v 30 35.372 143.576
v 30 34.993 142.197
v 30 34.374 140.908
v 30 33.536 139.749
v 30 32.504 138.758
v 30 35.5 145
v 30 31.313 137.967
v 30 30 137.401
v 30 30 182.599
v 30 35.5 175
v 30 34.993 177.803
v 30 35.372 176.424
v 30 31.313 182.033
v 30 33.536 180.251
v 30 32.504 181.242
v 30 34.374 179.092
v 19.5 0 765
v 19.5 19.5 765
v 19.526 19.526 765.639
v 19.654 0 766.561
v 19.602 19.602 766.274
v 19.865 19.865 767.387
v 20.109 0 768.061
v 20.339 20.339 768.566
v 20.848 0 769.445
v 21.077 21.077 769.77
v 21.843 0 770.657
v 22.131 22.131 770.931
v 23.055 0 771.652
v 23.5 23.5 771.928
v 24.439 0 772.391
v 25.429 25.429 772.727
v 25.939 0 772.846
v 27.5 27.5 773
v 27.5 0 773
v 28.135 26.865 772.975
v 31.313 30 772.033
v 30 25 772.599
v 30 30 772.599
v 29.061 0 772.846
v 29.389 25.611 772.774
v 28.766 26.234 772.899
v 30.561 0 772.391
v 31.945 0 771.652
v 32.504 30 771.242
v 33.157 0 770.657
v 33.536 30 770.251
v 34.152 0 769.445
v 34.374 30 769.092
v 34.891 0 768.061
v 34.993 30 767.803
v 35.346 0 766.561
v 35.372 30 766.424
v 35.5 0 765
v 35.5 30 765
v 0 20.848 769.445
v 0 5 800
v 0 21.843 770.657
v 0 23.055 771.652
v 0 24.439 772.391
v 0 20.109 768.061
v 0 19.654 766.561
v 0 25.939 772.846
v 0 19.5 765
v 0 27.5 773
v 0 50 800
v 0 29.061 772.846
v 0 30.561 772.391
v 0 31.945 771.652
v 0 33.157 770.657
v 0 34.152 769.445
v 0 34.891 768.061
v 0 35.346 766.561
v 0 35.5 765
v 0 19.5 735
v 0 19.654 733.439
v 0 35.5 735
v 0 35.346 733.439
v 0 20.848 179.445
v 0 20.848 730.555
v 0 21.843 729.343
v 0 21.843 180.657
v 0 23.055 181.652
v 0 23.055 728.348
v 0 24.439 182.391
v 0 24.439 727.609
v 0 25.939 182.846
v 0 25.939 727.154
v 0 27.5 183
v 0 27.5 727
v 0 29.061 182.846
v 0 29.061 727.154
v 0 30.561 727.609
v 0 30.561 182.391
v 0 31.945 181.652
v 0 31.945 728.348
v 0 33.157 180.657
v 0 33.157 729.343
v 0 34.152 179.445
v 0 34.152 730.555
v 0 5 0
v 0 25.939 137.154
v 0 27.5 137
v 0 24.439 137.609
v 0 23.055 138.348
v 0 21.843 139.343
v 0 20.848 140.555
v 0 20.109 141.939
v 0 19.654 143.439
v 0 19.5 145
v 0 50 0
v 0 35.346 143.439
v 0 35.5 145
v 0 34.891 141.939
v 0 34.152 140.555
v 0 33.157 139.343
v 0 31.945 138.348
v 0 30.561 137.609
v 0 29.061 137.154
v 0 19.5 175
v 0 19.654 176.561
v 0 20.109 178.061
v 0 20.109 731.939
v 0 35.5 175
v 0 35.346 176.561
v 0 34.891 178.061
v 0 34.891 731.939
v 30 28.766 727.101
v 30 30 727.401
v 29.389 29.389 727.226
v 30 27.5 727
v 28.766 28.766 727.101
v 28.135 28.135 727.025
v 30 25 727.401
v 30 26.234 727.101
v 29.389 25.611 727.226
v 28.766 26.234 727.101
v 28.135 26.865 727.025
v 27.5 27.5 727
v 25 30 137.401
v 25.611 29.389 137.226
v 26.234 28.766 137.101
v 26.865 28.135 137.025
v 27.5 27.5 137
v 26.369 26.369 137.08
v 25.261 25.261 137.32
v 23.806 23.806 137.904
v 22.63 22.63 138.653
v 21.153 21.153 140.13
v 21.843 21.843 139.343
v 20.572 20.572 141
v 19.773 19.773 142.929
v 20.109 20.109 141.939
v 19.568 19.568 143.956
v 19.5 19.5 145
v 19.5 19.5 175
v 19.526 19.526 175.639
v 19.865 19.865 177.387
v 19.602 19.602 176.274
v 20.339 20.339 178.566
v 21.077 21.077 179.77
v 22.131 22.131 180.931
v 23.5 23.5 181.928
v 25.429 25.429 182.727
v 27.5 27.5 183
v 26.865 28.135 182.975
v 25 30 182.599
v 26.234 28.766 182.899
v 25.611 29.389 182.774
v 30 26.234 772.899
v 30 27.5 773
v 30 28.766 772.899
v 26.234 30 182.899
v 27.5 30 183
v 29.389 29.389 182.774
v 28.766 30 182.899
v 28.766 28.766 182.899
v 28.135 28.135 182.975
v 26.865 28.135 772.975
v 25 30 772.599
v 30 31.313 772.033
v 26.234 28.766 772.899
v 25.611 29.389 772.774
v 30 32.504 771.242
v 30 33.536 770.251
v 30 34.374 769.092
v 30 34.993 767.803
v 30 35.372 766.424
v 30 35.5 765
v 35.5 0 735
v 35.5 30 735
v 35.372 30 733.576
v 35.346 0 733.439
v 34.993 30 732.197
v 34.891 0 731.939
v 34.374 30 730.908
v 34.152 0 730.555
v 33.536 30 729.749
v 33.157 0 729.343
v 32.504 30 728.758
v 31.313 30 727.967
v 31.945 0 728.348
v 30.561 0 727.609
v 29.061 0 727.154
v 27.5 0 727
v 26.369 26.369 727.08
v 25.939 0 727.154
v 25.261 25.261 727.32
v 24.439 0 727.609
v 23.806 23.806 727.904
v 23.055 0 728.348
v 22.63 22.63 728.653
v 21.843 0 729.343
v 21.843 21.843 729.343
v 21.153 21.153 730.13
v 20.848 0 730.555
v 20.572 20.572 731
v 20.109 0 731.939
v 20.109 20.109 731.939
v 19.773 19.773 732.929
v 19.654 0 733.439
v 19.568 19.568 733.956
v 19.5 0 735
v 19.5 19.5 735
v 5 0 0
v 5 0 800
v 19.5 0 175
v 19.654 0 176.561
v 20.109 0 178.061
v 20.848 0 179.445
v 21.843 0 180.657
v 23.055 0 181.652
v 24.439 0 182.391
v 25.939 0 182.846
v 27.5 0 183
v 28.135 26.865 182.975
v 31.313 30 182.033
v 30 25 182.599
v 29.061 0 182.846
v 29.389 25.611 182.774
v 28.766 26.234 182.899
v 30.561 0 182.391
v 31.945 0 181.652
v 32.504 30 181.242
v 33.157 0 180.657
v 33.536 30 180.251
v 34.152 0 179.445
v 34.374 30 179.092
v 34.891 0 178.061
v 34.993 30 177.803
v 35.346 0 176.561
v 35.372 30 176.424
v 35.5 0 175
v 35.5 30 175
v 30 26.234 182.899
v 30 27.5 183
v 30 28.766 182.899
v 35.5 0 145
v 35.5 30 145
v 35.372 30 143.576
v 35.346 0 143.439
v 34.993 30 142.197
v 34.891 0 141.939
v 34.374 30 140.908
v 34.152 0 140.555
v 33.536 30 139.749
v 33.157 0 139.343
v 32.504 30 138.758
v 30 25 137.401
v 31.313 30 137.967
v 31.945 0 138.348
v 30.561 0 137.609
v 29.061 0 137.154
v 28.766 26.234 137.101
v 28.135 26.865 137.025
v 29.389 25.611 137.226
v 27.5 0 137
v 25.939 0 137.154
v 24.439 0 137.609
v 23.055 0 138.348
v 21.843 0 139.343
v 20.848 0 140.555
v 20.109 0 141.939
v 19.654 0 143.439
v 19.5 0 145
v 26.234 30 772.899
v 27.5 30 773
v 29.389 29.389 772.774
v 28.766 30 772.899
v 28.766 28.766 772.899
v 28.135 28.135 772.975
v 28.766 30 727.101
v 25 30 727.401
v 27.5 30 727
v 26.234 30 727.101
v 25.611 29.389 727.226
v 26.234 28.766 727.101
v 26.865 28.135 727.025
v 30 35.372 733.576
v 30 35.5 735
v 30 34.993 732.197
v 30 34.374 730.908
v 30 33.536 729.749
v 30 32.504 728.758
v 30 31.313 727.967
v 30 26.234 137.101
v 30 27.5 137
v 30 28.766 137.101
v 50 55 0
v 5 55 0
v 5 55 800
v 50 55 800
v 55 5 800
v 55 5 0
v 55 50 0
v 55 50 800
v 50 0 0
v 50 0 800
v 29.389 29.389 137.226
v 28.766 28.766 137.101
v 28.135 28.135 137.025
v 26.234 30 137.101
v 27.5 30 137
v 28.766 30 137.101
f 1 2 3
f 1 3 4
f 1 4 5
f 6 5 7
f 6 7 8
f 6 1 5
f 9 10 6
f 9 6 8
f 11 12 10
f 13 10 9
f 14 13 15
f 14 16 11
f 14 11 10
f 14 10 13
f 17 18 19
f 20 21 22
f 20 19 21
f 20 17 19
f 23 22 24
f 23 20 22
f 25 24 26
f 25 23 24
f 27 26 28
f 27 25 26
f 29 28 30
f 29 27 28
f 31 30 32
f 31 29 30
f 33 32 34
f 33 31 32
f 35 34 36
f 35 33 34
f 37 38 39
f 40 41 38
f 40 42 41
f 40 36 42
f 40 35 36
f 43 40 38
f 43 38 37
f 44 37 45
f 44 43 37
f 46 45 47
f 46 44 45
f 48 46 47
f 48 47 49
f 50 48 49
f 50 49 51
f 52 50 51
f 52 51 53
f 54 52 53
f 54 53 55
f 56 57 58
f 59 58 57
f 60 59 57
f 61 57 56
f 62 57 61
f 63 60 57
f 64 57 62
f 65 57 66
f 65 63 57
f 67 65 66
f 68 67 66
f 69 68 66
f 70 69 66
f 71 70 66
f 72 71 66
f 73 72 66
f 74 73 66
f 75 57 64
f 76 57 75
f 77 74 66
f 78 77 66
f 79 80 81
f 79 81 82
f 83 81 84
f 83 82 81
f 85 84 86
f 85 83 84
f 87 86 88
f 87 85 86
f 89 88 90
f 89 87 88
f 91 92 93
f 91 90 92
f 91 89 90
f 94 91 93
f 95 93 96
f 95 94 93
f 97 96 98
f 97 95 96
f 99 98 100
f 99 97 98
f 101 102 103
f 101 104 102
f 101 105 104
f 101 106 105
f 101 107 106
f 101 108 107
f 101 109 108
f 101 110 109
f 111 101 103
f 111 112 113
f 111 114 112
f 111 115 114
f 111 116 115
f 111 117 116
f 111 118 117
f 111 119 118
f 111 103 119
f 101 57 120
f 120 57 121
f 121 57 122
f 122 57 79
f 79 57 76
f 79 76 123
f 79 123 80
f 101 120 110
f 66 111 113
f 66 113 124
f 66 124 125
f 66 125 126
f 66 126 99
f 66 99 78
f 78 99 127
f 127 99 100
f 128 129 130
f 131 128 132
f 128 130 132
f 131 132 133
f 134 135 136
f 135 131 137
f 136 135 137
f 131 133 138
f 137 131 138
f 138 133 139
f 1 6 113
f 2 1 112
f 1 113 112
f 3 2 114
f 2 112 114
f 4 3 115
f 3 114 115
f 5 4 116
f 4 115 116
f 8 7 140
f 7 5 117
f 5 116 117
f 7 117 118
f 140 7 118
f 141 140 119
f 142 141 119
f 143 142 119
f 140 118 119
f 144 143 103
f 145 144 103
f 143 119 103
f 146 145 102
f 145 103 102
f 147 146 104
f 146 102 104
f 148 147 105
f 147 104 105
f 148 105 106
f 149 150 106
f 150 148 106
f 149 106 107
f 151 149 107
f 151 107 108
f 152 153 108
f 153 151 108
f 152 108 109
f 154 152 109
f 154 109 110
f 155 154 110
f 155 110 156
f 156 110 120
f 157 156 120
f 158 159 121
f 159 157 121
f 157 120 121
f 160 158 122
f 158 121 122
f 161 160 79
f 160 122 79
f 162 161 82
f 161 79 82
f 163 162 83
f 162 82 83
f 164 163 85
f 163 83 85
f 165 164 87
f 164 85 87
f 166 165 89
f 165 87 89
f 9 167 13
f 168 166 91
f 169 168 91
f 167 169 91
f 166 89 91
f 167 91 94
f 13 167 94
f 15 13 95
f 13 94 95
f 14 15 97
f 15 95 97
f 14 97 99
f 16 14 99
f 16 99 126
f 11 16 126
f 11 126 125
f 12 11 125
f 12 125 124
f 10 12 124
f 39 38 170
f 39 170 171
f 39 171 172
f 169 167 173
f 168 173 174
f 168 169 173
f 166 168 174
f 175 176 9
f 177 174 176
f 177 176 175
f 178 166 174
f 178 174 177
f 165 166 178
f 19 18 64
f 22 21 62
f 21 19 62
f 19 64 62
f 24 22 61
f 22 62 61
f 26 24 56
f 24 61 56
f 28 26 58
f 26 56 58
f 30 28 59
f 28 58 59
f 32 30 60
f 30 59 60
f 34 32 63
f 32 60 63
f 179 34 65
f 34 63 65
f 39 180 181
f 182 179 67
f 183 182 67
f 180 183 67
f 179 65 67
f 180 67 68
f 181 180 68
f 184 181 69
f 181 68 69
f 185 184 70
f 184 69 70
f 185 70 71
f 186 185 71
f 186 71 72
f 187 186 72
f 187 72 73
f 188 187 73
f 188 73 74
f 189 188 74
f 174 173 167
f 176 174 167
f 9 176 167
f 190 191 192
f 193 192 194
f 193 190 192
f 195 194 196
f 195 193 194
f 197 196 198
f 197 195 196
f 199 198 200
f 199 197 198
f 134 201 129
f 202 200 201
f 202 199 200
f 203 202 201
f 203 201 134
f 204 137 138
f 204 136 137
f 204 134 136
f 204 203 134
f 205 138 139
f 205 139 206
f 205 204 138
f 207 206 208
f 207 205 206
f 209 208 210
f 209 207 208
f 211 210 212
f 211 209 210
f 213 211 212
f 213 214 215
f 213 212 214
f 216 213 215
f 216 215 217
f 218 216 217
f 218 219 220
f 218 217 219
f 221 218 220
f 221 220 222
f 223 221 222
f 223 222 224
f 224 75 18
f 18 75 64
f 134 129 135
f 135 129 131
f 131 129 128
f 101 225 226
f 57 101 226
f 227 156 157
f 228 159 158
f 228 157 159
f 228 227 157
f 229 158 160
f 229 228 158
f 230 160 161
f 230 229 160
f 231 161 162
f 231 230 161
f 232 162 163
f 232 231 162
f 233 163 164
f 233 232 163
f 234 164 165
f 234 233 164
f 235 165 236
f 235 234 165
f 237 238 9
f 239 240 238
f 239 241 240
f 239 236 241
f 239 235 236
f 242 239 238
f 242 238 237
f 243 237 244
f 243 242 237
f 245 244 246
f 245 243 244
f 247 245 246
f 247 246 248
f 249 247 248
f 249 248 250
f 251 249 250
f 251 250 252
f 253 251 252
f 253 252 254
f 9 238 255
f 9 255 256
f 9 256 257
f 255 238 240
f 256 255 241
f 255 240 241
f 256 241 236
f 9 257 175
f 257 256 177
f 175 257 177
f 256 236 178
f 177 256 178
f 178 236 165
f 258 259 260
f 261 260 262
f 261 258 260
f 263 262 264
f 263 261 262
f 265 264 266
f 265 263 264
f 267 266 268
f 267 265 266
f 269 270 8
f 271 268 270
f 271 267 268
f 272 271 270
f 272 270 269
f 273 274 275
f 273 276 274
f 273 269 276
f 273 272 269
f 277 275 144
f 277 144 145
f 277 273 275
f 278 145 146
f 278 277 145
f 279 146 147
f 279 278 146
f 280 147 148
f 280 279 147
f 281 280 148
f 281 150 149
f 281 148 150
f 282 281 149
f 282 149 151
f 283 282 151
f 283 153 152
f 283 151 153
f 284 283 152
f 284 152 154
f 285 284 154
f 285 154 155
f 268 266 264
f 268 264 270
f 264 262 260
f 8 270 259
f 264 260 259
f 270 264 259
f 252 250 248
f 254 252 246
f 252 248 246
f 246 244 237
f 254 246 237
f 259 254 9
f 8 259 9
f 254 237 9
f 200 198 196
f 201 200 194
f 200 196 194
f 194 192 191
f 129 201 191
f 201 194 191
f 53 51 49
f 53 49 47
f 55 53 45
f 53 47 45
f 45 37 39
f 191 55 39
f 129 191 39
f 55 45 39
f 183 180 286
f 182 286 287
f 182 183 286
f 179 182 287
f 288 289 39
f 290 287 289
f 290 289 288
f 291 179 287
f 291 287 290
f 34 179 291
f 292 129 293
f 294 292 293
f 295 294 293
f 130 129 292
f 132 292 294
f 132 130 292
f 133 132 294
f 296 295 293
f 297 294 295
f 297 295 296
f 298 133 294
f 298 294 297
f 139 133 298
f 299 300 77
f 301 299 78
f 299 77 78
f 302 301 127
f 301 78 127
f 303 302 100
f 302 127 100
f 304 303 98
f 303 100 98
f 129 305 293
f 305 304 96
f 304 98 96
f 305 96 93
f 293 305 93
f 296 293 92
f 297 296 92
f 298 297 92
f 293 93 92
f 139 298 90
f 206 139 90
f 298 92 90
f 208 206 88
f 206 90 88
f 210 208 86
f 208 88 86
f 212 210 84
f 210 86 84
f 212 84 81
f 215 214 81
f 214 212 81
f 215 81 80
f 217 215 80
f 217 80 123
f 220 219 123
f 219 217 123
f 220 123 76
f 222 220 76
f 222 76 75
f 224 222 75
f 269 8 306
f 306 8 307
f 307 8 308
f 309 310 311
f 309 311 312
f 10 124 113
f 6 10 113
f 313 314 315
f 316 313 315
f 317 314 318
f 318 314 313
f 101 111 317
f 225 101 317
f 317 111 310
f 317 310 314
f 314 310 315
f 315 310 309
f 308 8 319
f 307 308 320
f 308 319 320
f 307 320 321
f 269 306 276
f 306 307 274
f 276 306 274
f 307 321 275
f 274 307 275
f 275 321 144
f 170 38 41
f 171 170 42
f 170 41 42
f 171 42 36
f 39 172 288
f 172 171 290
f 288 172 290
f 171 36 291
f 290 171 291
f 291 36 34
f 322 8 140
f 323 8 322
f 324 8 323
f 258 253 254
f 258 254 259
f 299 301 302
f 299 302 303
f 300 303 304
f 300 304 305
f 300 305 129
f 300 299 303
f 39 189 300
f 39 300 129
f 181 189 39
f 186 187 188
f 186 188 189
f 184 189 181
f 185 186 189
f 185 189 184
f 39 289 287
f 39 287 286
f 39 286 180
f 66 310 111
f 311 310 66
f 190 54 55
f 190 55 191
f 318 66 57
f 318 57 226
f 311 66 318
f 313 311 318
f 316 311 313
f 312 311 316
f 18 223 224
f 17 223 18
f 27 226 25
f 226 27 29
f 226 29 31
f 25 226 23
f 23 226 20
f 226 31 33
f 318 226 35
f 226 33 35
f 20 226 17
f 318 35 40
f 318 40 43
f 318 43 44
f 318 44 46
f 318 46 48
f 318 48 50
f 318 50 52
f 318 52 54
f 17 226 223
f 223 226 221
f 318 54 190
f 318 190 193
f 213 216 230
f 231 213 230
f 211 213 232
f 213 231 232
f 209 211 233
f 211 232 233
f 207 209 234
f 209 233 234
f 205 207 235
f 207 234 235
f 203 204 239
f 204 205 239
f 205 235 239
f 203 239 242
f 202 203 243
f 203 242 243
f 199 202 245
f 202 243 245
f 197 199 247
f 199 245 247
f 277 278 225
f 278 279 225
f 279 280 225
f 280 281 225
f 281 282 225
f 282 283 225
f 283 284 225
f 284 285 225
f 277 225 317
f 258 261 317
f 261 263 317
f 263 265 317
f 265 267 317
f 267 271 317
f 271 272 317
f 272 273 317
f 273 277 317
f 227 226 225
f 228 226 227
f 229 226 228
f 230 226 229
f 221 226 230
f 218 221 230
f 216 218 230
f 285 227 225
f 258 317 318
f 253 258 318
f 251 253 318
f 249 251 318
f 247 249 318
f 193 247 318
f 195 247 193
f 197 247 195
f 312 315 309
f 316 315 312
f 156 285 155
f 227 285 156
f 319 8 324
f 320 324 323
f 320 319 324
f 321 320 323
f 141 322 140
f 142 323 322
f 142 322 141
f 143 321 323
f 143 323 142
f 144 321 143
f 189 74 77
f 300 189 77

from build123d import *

# Parameters (mm, degrees)
ESQUISSE1_W             = 55
ESQUISSE1_H             = 55
BOSS_EXTRU_1_DEPTH      = 800
ENL_V_MAT_EXTRU_1_DEPTH = 30
ENL_V_START             = -55
ENL_V_MAT_EXTRU_3_DEPTH = 30
CHANFREIN1_SIZE         = 5


with BuildPart() as part:
    # Esquisse1 → Boss.-Extru.1 (new body)
    with BuildSketch(Plane.XY):
        with Locations((27.5, 27.5)):
            Rectangle(ESQUISSE1_W, ESQUISSE1_H)
    extrude(amount=BOSS_EXTRU_1_DEPTH)

    # Esquisse2 → Enlèv. mat.-Extru.1 (cut)
    with BuildSketch(Plane.XZ):
        with BuildLine():
            Line((35.5, 175), (35.5, 145))
            ThreePointArc((35.5, 145), (27.5, 137), (19.5, 145))
            Line((19.5, 145), (19.5, 175))
            ThreePointArc((19.5, 175), (27.5, 183), (35.5, 175))
        make_face()
        with BuildLine():
            Line((19.5, 735), (19.5, 765))
            ThreePointArc((19.5, 765), (27.5, 773), (35.5, 765))
            Line((35.5, 765), (35.5, 735))
            ThreePointArc((35.5, 735), (27.5, 727), (19.5, 735))
        make_face()
    extrude(amount=-ENL_V_MAT_EXTRU_1_DEPTH, mode=Mode.SUBTRACT)

    # Esquisse3<2> → Enlèv. mat.-Extru.3 (cut)
    with BuildSketch(Plane(origin=(55, 0, 0), x_dir=(0, 0, -1), z_dir=(1, 0, 0)).offset(ENL_V_START)):
        with BuildLine():
            Line((-175, 35.5), (-145, 35.5))
            ThreePointArc((-145, 35.5), (-137, 27.5), (-145, 19.5))
            Line((-145, 19.5), (-175, 19.5))
            ThreePointArc((-175, 19.5), (-183, 27.5), (-175, 35.5))
        make_face()
        with BuildLine():
            Line((-765, 35.5), (-735, 35.5))
            ThreePointArc((-735, 35.5), (-727, 27.5), (-735, 19.5))
            Line((-735, 19.5), (-765, 19.5))
            ThreePointArc((-765, 19.5), (-773, 27.5), (-765, 35.5))
        make_face()
    extrude(amount=ENL_V_MAT_EXTRU_3_DEPTH, mode=Mode.SUBTRACT)

    # Chanfrein1
    chanfrein1_edges = [part.edges().sort_by_distance(p)[0] for p in [
        (0, 55, 400),
        (55, 55, 400),
        (55, 0, 400),
        (0, 0, 400),
    ]]
    chamfer(chanfrein1_edges, length=CHANFREIN1_SIZE)


solid = part.part
